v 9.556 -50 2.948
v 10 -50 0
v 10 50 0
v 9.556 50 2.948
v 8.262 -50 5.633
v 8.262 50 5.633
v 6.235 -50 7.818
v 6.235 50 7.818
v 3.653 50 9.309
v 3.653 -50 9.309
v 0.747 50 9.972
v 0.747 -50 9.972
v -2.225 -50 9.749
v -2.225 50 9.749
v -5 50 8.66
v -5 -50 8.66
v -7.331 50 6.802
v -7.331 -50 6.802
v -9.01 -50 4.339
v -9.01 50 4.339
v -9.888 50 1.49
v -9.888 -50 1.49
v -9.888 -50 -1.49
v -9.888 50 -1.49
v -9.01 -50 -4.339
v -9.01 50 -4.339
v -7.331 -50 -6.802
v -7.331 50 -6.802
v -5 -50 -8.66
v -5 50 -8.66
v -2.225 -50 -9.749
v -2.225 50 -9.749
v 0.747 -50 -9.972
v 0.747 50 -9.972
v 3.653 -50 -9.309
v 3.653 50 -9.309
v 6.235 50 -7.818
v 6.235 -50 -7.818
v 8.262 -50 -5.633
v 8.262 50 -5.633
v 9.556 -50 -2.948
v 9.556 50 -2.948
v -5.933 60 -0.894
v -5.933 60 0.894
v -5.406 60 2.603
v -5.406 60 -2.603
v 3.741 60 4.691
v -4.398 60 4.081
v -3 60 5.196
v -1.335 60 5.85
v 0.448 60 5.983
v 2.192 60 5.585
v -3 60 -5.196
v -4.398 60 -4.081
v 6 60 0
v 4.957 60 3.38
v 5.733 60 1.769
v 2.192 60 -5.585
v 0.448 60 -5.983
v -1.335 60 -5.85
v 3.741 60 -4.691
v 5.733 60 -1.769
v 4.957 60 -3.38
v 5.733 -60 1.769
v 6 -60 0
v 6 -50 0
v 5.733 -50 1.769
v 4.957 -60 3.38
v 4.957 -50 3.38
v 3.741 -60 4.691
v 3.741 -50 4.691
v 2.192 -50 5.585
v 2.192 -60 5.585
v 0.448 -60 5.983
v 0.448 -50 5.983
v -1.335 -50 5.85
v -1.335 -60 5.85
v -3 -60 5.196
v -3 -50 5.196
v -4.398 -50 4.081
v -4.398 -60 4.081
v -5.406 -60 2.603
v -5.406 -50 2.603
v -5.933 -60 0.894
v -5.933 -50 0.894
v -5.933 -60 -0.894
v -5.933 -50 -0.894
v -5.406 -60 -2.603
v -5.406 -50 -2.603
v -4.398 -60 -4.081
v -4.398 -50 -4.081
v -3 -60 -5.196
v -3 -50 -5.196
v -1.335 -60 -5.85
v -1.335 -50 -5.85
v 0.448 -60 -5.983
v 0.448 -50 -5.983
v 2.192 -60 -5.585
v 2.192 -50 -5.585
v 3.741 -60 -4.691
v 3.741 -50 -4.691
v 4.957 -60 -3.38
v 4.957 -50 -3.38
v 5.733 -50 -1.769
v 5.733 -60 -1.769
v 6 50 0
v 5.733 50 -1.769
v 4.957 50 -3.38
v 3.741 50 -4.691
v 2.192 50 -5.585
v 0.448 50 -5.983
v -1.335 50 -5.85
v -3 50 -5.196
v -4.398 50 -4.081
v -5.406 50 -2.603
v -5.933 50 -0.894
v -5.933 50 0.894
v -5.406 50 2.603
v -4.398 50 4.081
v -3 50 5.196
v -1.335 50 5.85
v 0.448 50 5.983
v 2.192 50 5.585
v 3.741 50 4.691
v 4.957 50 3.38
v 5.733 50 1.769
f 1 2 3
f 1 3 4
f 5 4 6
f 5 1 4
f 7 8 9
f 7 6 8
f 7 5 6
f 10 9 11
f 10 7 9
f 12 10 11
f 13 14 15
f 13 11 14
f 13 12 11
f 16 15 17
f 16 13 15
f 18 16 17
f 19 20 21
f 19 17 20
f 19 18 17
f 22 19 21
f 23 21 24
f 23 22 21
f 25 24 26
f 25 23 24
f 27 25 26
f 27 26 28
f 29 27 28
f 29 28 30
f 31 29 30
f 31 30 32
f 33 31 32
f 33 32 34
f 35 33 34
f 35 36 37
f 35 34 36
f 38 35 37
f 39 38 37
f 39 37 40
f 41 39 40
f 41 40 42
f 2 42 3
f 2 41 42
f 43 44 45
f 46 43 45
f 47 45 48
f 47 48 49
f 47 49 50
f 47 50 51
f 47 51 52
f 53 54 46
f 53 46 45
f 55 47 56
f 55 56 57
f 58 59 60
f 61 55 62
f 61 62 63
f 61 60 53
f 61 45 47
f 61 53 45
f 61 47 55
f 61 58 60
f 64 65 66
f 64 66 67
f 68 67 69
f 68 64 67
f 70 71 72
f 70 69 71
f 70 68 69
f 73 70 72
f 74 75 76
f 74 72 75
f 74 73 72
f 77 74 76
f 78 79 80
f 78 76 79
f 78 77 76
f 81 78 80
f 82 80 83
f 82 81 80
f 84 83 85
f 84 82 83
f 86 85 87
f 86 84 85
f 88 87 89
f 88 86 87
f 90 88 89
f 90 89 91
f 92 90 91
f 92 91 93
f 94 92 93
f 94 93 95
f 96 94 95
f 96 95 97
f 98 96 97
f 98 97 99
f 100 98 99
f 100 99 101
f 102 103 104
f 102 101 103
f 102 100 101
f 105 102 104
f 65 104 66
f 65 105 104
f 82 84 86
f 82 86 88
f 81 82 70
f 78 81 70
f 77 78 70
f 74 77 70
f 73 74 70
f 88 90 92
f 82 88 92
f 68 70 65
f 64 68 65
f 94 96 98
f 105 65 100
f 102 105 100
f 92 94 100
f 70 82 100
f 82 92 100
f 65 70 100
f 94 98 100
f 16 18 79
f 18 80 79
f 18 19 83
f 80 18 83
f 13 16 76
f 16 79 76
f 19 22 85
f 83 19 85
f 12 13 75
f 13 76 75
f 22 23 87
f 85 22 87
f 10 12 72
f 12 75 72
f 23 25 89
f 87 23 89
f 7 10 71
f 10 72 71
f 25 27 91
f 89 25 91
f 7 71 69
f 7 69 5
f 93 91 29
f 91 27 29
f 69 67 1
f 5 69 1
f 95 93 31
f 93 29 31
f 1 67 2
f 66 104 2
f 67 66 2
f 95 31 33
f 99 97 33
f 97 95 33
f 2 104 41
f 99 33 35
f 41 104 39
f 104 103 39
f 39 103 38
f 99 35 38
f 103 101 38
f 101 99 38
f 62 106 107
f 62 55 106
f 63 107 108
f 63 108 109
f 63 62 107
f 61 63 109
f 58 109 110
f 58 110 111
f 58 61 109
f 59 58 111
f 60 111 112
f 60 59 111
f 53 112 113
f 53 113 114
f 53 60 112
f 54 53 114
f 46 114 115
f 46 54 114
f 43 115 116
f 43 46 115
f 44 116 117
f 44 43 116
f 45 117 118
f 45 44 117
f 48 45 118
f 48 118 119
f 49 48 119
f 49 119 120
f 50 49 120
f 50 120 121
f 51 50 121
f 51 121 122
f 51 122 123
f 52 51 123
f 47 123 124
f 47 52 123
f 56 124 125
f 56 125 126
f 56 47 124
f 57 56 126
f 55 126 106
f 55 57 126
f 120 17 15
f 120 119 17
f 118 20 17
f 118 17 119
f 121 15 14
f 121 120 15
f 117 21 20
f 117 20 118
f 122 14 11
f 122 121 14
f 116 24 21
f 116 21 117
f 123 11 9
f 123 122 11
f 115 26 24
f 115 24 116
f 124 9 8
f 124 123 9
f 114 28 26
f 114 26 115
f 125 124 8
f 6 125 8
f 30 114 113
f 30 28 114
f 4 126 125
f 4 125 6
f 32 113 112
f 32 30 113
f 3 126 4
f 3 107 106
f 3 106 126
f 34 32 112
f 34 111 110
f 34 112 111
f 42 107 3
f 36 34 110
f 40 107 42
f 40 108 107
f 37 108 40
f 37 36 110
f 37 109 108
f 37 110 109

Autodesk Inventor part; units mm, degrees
ref_plane "YZ Plane" through (0, 0, 0) normal (1, 0, 0) x (0, 1, 0)
ref_plane "XZ Plane" through (0, 0, 0) normal (0, 1, 0) x (-1, 0, 0)
ref_plane "XY Plane" through (0, 0, 0) normal (0, 0, 1) x (1, 0, 0)
sketch "草圖1" plane through (0, 0, 0) normal (0, 0, 1) x (1, 0, 0)
  line L0 (0, 50) -> (10, 50)
  line L1 (10, 50) -> (10, -50)
  line L2 (10, -50) -> (0, -50)
  line L3 (0, -50) -> (0, 50)
  line L4 (0, 50) -> (6, 50)
  line L5 (6, 50) -> (6, 60)
  line L6 (6, 60) -> (0, 60)
  line L7 (0, 60) -> (0, 50)
  line L8 (0, -50) -> (6, -50)
  line L9 (6, -50) -> (6, -60)
  line L10 (6, -60) -> (0, -60)
  line L11 (0, -60) -> (0, -50)
  point P0 (0, 0)
  point P1 (10, 0)
  dimension "d0" = 10
  dimension "d1" = 6
  dimension "d2" = 6
  dimension "d3" = 120
  dimension "d4" = 100
  dimension "d5" = 10
revolve "迴轉1" add sketch "草圖1" angle 360 about axis through (0, -50, 0) along (0, 1, 0)
properties part number "P9"
